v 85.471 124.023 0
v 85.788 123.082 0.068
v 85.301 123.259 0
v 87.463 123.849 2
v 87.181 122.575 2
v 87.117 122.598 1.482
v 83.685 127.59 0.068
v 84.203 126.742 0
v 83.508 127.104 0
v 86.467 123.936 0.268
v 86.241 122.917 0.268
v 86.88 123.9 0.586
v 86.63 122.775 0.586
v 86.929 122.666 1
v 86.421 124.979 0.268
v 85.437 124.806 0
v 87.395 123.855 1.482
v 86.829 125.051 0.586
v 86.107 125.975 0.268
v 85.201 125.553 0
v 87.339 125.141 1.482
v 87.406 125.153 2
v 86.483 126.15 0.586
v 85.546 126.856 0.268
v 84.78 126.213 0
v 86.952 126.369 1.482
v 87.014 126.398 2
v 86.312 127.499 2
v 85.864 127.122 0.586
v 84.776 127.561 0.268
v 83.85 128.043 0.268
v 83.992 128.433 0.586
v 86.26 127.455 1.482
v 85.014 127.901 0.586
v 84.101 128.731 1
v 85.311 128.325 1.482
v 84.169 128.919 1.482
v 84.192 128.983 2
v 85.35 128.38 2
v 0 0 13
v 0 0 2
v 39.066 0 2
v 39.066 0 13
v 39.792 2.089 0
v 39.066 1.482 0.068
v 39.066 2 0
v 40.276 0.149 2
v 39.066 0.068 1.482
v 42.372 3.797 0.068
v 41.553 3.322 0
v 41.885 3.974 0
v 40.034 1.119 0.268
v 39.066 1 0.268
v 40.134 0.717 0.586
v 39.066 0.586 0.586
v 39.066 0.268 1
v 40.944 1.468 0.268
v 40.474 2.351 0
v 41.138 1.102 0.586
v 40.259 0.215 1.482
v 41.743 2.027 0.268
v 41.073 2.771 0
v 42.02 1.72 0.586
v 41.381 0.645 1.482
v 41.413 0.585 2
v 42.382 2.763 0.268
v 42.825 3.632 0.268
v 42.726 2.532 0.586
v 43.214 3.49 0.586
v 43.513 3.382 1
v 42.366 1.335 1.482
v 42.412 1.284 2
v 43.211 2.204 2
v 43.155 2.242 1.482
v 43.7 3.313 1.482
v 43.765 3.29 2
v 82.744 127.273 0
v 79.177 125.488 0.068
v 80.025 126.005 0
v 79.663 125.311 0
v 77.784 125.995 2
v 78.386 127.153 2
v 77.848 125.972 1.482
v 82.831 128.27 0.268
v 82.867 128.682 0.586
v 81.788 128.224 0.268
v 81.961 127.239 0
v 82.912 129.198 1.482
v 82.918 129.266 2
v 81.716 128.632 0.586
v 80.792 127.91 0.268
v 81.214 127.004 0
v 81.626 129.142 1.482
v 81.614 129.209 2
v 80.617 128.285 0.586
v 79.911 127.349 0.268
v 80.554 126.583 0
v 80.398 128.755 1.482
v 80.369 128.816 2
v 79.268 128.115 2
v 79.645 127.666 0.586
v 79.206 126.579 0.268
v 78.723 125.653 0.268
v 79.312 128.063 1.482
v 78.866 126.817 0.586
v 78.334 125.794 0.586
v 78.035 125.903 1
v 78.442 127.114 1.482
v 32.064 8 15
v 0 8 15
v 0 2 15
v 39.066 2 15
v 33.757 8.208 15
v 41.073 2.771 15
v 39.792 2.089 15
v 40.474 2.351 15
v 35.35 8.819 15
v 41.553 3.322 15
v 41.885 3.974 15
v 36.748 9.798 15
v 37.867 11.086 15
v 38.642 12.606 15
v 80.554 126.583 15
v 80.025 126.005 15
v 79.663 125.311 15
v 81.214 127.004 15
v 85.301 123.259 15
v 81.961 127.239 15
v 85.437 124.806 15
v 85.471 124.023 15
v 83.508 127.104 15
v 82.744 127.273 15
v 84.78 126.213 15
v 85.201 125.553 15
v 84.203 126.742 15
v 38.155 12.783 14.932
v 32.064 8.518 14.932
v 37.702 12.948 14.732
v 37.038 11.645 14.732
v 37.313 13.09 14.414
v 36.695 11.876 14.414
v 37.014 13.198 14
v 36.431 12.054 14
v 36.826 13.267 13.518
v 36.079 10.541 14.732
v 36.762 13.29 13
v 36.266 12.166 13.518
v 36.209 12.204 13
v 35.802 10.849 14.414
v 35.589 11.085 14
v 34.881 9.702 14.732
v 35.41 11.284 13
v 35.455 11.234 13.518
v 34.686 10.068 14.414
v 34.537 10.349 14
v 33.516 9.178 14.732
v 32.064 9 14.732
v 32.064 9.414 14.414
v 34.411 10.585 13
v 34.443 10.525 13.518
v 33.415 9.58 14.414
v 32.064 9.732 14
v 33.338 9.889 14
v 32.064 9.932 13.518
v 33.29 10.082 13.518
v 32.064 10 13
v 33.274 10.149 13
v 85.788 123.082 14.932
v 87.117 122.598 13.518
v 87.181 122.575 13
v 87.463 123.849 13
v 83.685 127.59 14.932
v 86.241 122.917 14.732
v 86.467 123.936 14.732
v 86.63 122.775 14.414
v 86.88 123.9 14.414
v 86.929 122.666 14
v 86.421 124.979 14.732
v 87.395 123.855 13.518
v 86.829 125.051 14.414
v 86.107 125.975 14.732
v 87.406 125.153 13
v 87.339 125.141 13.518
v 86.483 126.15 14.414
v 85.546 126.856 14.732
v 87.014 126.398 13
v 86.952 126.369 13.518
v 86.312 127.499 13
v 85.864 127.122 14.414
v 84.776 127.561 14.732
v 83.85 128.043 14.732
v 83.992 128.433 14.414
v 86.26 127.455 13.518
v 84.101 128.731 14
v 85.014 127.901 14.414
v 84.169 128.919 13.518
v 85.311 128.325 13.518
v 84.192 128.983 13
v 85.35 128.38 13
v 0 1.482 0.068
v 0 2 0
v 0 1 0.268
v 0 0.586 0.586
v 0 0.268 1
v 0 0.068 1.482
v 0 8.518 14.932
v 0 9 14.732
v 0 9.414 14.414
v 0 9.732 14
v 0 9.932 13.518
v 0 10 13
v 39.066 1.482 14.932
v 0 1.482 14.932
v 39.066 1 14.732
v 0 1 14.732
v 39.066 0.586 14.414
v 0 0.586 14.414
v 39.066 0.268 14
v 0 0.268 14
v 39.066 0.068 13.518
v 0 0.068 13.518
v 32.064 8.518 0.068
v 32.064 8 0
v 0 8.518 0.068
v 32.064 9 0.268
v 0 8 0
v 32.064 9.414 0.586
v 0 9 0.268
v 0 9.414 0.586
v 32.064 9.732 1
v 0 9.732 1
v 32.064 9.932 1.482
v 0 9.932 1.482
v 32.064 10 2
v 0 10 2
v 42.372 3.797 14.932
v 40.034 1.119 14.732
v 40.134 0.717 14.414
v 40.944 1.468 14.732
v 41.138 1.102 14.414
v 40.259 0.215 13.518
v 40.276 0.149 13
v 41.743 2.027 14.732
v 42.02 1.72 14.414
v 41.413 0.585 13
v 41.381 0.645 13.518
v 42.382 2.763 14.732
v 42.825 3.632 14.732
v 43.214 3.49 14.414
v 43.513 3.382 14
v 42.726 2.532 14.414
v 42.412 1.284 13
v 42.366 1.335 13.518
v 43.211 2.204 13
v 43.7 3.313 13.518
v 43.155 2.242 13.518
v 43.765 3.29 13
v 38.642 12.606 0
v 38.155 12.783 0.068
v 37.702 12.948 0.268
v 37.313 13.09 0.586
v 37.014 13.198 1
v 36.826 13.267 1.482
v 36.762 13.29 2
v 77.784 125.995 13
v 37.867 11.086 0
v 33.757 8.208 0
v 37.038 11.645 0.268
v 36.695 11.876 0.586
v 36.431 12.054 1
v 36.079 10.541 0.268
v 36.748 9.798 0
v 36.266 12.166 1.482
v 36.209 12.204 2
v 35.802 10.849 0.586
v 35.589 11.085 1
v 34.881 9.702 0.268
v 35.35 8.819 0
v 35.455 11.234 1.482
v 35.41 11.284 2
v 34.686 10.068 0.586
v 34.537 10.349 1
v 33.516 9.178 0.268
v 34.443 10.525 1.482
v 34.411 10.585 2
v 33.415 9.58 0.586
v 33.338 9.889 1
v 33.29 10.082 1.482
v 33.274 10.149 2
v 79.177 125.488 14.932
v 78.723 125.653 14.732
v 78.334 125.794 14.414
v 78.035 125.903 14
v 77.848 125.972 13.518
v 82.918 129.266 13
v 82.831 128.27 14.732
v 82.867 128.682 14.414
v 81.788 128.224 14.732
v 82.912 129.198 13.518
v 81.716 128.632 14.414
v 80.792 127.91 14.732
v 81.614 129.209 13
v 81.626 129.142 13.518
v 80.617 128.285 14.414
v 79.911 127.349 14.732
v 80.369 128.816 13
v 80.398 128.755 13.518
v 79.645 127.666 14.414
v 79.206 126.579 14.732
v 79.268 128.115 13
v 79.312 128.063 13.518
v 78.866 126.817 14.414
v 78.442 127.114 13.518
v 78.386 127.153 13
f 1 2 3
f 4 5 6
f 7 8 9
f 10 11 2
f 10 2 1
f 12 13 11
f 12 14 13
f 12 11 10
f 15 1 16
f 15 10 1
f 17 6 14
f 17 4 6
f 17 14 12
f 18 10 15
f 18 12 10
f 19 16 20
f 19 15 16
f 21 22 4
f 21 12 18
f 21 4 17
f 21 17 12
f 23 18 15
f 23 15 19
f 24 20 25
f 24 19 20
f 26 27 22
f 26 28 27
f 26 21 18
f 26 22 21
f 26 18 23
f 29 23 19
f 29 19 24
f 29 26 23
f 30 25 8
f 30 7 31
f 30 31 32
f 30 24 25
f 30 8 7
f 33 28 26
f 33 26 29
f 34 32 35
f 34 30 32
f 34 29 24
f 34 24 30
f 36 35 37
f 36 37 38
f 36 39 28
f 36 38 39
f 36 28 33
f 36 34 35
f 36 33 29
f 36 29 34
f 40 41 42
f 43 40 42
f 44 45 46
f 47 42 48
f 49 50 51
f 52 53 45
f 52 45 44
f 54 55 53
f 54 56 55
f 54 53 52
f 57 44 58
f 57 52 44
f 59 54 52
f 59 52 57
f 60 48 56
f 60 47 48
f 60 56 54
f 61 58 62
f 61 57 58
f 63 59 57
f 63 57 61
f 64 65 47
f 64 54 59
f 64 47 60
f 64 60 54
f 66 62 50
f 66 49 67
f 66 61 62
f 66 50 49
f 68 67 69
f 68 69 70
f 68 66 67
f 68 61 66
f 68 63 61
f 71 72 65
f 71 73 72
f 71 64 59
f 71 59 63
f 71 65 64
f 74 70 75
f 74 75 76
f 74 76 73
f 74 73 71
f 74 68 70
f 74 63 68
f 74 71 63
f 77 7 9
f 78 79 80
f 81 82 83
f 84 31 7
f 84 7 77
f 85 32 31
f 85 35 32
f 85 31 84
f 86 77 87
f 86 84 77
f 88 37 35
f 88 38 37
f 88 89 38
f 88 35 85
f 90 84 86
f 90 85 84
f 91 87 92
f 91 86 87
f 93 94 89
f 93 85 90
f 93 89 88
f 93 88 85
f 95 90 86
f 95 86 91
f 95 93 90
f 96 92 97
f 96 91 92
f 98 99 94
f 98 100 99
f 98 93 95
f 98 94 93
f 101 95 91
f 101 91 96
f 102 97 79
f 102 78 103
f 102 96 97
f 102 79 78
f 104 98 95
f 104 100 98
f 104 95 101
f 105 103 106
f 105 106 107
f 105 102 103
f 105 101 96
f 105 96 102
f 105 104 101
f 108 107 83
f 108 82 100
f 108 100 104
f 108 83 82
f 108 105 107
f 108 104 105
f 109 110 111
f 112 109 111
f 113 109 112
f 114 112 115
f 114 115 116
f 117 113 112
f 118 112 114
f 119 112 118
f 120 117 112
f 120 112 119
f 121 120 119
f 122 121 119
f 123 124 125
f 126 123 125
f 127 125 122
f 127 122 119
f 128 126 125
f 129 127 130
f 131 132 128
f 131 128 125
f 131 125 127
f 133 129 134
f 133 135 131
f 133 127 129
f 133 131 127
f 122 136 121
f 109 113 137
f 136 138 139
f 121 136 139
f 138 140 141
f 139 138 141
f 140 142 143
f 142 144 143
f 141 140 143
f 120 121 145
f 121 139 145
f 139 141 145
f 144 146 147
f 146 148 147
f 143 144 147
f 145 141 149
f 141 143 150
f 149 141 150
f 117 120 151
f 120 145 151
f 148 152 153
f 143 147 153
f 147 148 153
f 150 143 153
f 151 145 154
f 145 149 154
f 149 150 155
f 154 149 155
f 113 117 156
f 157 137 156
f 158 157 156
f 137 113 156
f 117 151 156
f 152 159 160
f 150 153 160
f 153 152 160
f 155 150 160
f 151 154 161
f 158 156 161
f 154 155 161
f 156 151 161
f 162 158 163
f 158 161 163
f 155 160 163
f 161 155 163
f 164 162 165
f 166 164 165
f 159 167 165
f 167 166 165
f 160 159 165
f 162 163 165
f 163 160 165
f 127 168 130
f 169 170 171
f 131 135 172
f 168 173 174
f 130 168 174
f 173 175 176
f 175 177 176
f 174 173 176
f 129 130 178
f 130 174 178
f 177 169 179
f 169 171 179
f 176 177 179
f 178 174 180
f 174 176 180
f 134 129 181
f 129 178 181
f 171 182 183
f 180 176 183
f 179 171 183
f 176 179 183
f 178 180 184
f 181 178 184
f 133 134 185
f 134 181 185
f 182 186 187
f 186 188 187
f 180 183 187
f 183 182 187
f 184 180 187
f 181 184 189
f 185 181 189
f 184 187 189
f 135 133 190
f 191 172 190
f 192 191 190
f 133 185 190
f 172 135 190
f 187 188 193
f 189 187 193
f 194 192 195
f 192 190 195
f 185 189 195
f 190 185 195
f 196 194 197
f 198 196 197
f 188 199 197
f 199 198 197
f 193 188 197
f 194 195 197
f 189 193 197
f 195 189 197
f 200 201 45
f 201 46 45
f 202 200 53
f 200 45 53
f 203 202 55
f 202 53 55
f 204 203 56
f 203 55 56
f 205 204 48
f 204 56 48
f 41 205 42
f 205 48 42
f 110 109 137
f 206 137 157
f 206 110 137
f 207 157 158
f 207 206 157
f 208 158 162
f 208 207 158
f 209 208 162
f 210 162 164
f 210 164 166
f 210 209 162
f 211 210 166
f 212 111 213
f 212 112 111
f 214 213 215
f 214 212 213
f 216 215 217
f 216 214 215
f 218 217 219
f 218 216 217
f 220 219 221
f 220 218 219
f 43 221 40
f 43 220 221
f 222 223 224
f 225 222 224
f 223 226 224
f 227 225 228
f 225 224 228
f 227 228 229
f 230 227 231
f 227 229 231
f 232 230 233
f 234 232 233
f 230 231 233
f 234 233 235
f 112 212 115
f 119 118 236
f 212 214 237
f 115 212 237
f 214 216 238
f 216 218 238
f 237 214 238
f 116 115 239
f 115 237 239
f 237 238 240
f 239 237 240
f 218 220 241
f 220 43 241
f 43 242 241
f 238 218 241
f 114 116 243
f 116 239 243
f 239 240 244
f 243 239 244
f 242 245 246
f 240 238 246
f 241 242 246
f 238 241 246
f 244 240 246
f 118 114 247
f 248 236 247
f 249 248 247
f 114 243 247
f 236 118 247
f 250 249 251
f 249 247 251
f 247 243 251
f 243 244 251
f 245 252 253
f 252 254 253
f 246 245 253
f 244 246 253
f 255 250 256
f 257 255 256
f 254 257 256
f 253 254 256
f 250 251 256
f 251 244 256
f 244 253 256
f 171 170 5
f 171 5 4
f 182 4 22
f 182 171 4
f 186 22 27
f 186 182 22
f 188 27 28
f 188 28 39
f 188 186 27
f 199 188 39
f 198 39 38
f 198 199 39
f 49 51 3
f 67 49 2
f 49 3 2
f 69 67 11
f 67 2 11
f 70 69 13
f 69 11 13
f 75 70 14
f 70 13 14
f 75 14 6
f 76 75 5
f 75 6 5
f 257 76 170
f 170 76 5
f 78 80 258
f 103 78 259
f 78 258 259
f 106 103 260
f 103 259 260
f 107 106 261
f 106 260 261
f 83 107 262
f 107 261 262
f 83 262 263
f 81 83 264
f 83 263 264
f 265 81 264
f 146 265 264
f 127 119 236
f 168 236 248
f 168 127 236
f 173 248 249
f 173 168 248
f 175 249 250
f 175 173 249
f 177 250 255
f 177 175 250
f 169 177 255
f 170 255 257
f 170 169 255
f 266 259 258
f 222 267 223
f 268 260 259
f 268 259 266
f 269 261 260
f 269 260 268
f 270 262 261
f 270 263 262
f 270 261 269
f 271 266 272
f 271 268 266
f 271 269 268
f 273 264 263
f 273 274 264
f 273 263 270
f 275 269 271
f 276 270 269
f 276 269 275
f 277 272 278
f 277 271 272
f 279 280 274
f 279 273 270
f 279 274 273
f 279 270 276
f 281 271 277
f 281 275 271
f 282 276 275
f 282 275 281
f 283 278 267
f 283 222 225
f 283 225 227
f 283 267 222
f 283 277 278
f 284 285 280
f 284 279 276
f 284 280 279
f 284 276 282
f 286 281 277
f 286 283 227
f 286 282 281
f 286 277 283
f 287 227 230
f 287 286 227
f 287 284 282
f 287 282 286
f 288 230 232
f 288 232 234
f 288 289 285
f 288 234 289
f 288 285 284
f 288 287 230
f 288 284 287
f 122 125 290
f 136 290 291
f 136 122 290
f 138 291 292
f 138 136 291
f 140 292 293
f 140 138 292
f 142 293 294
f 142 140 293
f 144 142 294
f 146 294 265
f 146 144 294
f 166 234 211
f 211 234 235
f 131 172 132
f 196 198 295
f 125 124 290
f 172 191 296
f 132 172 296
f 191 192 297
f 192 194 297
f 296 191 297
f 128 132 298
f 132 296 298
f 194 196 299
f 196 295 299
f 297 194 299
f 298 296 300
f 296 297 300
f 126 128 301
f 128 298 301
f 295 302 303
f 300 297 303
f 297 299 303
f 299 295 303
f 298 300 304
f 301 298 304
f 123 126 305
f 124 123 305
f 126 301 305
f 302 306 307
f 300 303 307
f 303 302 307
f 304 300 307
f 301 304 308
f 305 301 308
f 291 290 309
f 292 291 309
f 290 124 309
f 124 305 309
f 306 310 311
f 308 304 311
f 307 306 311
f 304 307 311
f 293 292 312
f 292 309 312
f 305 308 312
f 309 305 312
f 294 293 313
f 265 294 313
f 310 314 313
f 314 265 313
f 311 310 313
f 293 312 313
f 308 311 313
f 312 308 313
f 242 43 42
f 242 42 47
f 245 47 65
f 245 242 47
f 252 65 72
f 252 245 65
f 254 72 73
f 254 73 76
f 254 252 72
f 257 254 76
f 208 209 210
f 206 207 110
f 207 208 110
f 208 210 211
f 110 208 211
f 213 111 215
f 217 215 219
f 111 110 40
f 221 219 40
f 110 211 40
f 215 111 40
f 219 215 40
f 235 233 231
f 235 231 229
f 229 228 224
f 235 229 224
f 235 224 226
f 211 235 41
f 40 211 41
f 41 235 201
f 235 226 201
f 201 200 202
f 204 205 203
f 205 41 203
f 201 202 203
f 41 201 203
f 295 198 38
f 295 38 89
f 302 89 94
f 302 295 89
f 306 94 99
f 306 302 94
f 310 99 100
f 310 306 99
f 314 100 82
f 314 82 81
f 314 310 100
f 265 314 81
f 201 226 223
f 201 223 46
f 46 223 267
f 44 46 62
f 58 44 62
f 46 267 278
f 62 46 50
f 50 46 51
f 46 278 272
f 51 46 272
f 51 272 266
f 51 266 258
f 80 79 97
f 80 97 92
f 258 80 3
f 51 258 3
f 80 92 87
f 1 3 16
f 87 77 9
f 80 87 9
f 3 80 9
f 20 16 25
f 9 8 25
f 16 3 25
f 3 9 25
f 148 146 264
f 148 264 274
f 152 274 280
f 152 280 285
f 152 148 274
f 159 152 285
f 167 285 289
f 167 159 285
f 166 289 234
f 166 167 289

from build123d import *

# Parameters (mm, degrees)
F1_DEPTH = 15
F2_R     = 4.99999
F3_R     = 2


# Not quite as in the source:
# - a fillet or chamfer is up to 0.001 mm smaller than in the source, because OpenCascade refuses the exact size


with BuildPart() as f1:
    # F0 (on Top) → F1 (new body)
    with BuildSketch(Plane.XY):
        Polygon((0, 10), (0, 0), (42.567110899, 0), (88.8907263303, 127.2730873849), (79.4938001224, 130.6932888181), (35.5650355169, 10), align=None)
    extrude(amount=F1_DEPTH)

    # F2 (radius 5 in the source; OpenCascade refuses exactly that, so slightly less here)
    f2_edges = [f1.edges().sort_by_distance(p)[0] for p in [
        (35.565036, 10, 7.5),
        (42.567111, 0, 7.5),
        (79.4938, 130.693289, 7.5),
        (88.890726, 127.273087, 7.5),
    ]]
    fillet(f2_edges, radius=F2_R)

    # F3
    f3_edges = [f1.edges().sort_by_distance(p)[0] for p in [
        (57.273081, 69.642364, 15),
        (57.273081, 69.642364, 0),
    ]]
    fillet(f3_edges, radius=F3_R)


solid = f1.part
